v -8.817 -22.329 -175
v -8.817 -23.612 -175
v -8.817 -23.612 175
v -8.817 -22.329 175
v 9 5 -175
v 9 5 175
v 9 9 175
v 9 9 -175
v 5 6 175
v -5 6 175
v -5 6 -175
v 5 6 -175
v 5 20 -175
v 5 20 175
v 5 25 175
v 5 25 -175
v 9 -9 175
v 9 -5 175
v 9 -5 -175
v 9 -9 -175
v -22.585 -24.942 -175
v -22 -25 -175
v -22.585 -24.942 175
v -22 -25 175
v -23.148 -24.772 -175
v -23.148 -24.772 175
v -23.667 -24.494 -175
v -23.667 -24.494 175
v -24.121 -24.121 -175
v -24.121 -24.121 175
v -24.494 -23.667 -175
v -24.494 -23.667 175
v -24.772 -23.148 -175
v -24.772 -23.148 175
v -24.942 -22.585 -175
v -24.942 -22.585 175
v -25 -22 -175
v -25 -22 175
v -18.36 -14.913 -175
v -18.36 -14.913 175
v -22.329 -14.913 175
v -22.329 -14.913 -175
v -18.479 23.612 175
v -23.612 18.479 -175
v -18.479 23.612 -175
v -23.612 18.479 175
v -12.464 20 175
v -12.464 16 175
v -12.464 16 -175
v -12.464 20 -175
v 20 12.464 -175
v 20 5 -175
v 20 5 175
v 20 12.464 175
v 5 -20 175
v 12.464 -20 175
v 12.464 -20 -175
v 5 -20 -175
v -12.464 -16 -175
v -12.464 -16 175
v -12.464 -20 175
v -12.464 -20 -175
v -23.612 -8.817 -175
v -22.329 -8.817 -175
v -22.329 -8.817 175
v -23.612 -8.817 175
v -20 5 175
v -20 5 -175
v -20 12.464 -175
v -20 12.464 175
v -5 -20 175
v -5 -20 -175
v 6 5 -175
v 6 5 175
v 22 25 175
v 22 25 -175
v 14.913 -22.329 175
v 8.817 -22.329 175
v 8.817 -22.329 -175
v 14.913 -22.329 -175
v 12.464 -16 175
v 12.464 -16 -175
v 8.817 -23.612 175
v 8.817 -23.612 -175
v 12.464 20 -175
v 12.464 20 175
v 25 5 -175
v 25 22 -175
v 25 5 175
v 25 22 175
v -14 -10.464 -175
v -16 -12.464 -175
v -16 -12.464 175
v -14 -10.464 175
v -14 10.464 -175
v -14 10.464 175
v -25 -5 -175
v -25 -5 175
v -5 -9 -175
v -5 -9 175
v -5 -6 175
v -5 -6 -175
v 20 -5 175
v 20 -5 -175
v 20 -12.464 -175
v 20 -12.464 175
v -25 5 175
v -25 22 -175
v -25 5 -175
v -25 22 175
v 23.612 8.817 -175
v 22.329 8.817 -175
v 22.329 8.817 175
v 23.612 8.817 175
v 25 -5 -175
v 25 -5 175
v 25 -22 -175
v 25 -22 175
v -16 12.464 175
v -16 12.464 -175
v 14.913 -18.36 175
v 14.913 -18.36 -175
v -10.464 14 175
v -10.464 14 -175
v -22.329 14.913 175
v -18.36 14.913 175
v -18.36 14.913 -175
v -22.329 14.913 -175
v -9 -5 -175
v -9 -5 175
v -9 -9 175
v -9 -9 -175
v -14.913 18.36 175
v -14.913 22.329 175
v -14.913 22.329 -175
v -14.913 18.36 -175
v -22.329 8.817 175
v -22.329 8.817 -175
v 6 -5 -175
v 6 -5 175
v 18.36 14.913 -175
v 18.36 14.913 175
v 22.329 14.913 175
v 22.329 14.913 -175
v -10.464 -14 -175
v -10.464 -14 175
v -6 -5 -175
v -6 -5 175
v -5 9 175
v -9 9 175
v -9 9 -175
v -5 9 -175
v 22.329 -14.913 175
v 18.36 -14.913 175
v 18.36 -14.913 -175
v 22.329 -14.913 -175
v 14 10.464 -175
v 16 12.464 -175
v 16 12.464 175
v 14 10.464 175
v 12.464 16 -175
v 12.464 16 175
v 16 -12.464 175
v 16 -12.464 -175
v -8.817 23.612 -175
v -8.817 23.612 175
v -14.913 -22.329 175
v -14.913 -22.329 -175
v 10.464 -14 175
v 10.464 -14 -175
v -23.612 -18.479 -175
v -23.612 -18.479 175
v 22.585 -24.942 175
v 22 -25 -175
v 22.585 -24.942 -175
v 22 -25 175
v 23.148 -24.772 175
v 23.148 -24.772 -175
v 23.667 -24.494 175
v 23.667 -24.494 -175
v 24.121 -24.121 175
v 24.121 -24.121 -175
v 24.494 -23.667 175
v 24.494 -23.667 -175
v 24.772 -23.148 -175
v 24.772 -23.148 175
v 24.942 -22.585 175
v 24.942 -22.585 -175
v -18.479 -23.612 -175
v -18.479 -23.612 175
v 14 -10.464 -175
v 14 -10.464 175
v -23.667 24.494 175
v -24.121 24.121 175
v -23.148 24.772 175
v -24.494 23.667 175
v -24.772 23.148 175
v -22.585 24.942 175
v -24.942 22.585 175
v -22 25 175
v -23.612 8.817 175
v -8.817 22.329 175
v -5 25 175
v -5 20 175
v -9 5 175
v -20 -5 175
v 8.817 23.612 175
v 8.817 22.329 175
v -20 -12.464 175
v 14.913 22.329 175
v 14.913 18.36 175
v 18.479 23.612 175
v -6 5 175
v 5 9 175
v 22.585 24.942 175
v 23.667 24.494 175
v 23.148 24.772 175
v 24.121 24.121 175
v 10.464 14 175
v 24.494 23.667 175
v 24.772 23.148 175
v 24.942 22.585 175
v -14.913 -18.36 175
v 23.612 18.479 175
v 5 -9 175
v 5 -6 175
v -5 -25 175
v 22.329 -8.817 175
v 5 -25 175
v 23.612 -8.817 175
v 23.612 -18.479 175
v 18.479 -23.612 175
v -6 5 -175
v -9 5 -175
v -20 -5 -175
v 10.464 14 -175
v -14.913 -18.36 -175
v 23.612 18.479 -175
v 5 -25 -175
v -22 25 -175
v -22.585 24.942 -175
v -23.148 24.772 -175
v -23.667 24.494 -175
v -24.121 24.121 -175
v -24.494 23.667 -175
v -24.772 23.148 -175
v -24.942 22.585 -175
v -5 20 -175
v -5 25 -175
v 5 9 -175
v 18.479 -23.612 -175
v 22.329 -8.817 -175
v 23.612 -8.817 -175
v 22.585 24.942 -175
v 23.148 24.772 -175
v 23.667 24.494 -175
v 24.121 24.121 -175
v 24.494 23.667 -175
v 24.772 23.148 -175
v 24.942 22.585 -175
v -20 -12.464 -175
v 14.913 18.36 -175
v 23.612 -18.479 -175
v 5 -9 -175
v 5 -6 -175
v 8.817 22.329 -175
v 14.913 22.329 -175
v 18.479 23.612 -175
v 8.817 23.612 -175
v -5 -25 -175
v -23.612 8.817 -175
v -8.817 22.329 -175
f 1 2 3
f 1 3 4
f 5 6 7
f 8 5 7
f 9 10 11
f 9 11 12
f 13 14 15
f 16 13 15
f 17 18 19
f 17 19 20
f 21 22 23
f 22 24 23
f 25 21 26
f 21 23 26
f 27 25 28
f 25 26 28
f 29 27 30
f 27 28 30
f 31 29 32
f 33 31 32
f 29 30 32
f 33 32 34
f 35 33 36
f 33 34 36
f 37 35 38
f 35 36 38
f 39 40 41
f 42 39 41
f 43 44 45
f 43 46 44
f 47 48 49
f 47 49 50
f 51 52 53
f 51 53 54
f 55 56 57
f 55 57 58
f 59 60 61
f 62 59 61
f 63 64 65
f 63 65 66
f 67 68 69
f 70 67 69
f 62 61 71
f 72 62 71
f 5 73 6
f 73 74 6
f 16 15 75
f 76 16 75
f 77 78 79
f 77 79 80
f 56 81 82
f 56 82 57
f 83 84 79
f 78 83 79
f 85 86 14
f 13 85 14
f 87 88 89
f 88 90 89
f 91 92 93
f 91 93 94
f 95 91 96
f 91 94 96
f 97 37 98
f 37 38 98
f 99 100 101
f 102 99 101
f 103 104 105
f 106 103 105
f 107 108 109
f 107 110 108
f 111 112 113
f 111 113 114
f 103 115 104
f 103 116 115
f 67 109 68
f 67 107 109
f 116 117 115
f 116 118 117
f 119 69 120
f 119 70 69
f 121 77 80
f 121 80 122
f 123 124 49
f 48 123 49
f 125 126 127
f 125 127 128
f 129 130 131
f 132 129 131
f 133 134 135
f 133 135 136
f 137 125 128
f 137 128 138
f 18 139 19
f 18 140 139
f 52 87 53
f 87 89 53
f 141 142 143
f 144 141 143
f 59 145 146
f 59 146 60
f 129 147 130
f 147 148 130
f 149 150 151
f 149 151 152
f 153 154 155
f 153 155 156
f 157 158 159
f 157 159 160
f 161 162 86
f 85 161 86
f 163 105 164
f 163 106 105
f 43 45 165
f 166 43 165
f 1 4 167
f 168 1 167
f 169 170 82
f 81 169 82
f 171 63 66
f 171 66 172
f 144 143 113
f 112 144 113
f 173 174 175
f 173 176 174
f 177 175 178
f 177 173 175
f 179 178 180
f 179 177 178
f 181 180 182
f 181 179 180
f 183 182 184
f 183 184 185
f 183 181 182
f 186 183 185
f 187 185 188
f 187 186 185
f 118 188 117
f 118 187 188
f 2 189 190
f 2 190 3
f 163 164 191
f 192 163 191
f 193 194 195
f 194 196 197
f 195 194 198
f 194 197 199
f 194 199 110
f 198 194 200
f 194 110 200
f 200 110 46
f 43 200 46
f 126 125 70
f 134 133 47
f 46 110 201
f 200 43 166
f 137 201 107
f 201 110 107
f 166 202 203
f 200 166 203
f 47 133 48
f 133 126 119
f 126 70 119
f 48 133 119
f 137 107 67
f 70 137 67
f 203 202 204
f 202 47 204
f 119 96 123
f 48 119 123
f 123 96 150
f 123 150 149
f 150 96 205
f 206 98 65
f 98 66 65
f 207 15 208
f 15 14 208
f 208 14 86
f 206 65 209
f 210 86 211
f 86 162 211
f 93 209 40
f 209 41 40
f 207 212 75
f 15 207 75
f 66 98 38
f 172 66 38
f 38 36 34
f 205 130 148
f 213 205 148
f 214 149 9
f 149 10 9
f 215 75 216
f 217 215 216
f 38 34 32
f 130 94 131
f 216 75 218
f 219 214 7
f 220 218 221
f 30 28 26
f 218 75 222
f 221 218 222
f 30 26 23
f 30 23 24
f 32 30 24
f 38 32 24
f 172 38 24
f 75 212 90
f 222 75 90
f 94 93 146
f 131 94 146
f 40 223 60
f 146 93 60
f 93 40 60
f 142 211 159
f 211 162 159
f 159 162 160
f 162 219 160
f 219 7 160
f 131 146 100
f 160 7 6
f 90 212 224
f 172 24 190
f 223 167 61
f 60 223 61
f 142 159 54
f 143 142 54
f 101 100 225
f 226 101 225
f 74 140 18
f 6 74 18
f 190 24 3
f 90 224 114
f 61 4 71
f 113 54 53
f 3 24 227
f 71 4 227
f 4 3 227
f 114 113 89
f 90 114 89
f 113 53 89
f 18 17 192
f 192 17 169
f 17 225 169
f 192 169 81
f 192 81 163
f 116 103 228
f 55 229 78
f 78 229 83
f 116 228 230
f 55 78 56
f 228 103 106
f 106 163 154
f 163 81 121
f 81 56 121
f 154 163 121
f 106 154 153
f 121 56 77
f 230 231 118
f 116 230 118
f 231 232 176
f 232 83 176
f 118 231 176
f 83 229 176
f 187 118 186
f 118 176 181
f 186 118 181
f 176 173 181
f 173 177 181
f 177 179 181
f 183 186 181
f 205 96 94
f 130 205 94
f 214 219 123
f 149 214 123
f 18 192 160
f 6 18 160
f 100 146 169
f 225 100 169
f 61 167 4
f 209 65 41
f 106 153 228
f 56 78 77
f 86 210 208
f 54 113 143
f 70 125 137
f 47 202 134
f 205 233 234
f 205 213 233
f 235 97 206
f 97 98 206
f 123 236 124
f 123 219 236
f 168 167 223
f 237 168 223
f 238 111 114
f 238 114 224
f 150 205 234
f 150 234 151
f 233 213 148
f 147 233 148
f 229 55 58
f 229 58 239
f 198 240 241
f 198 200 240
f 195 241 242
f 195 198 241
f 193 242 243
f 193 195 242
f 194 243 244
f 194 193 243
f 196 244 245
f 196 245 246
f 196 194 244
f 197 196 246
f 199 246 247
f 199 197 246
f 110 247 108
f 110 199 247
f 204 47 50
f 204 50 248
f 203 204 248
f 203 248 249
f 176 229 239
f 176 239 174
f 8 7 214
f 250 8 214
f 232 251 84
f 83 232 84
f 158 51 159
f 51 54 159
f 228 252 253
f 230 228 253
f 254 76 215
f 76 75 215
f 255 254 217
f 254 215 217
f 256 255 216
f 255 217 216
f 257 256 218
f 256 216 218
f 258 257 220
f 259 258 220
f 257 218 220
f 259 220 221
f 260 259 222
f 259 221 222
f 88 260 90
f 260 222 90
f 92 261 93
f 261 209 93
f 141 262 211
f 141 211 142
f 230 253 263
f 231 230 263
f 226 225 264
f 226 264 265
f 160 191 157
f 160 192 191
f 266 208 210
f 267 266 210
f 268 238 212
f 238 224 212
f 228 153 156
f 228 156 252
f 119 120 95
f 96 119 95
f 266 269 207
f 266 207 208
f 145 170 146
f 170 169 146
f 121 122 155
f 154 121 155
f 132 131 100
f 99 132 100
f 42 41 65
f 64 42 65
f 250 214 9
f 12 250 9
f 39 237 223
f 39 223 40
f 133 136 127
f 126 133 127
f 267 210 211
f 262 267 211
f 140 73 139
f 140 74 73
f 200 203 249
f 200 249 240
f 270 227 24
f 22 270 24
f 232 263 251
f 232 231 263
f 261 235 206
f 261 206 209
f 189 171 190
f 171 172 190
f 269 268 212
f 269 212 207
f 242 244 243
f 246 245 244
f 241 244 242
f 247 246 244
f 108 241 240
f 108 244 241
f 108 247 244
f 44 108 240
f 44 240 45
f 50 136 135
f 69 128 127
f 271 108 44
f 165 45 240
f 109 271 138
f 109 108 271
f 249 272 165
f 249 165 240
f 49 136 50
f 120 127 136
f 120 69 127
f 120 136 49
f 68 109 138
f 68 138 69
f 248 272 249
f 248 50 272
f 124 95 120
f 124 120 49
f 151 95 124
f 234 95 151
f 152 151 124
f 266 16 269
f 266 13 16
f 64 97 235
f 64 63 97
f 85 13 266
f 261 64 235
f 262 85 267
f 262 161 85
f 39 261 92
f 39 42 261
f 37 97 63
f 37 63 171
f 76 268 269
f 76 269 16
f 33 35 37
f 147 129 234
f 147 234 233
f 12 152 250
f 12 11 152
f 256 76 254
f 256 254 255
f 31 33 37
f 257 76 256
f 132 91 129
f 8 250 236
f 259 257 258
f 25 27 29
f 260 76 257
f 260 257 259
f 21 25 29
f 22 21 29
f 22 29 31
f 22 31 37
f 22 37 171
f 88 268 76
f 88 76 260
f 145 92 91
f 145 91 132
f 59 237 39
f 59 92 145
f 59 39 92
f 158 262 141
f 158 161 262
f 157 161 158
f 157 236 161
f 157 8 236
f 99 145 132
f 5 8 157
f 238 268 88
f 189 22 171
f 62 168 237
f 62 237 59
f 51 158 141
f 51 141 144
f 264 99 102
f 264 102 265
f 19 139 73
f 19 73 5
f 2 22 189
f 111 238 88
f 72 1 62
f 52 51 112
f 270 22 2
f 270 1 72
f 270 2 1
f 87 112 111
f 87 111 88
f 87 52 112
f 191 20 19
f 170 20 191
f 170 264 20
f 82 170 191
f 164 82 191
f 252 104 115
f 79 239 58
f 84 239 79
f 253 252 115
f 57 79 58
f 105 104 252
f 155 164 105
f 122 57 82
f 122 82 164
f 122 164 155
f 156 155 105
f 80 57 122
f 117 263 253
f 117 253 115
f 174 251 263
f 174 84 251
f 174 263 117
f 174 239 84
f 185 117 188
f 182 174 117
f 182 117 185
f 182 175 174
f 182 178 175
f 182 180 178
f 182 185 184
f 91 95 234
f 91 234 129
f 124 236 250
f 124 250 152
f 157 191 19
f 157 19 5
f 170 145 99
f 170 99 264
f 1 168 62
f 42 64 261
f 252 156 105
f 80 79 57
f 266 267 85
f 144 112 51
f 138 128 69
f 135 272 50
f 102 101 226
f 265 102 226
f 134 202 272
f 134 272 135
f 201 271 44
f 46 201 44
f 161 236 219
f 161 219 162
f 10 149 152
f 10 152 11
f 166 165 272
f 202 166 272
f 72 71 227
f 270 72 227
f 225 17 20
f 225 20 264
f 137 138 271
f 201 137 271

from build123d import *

# Parameters (mm, degrees)
SALIENTE_EXTRUIR1_DEPTH = 175


with BuildPart() as part:
    # Croquis1 → Saliente-Extruir1 (new, symmetric)
    with BuildSketch(Plane.XY):
        with BuildLine():
            Line((5, 25), (22, 25))
            ThreePointArc((22, 25), (24.121320344, 24.121320344), (25, 22))
            Line((25, 22), (25, 5))
            Line((25, 5), (20, 5))
            Line((20, 5), (20, 12.464466094))
            Line((20, 12.464466094), (16, 12.464466094))
            Line((16, 12.464466094), (14, 10.464466094))
            Line((14, 10.464466094), (14, 0))
            Line((14, 0), (6, 0))
            Line((6, 0), (6, 5))
            Line((6, 5), (9, 5))
            Line((9, 5), (9, 9))
            Line((9, 9), (5, 9))
            Line((5, 9), (5, 6))
            Line((5, 6), (0, 6))
            Line((0, 6), (0, 14))
            Line((0, 14), (10.464466094, 14))
            Line((10.464466094, 14), (12.464466094, 16))
            Line((12.464466094, 16), (12.464466094, 20))
            Line((12.464466094, 20), (5, 20))
            Line((5, 20), (5, 25))
        make_face()
        Polygon((23.61230751, 18.478547627), (18.478547627, 23.61230751), (8.817158017, 23.61230751), (8.817158017, 22.328867539), (14.913358785, 22.328867539), (14.913358785, 18.359777384), (18.359777384, 14.913358785), (22.328867539, 14.913358785), (22.328867539, 8.817158017), (23.61230751, 8.817158017), align=None, mode=Mode.SUBTRACT)
    saliente_extruir1 = extrude(amount=SALIENTE_EXTRUIR1_DEPTH, both=True)

    # Simetría1: Saliente-Extruir1 across plane
    add(saliente_extruir1.mirror(Plane(origin=(0, 14, 175), x_dir=(0, 0, 1), z_dir=(1, 0, 0))))

    # Simetría7: part across plane


with BuildPart() as part_1:
    add(part.part)
    add(part.part.mirror(Plane(origin=(6, 0, 175), x_dir=(0, 0, 1), z_dir=(0, 1, 0))))


solid = part_1.part
